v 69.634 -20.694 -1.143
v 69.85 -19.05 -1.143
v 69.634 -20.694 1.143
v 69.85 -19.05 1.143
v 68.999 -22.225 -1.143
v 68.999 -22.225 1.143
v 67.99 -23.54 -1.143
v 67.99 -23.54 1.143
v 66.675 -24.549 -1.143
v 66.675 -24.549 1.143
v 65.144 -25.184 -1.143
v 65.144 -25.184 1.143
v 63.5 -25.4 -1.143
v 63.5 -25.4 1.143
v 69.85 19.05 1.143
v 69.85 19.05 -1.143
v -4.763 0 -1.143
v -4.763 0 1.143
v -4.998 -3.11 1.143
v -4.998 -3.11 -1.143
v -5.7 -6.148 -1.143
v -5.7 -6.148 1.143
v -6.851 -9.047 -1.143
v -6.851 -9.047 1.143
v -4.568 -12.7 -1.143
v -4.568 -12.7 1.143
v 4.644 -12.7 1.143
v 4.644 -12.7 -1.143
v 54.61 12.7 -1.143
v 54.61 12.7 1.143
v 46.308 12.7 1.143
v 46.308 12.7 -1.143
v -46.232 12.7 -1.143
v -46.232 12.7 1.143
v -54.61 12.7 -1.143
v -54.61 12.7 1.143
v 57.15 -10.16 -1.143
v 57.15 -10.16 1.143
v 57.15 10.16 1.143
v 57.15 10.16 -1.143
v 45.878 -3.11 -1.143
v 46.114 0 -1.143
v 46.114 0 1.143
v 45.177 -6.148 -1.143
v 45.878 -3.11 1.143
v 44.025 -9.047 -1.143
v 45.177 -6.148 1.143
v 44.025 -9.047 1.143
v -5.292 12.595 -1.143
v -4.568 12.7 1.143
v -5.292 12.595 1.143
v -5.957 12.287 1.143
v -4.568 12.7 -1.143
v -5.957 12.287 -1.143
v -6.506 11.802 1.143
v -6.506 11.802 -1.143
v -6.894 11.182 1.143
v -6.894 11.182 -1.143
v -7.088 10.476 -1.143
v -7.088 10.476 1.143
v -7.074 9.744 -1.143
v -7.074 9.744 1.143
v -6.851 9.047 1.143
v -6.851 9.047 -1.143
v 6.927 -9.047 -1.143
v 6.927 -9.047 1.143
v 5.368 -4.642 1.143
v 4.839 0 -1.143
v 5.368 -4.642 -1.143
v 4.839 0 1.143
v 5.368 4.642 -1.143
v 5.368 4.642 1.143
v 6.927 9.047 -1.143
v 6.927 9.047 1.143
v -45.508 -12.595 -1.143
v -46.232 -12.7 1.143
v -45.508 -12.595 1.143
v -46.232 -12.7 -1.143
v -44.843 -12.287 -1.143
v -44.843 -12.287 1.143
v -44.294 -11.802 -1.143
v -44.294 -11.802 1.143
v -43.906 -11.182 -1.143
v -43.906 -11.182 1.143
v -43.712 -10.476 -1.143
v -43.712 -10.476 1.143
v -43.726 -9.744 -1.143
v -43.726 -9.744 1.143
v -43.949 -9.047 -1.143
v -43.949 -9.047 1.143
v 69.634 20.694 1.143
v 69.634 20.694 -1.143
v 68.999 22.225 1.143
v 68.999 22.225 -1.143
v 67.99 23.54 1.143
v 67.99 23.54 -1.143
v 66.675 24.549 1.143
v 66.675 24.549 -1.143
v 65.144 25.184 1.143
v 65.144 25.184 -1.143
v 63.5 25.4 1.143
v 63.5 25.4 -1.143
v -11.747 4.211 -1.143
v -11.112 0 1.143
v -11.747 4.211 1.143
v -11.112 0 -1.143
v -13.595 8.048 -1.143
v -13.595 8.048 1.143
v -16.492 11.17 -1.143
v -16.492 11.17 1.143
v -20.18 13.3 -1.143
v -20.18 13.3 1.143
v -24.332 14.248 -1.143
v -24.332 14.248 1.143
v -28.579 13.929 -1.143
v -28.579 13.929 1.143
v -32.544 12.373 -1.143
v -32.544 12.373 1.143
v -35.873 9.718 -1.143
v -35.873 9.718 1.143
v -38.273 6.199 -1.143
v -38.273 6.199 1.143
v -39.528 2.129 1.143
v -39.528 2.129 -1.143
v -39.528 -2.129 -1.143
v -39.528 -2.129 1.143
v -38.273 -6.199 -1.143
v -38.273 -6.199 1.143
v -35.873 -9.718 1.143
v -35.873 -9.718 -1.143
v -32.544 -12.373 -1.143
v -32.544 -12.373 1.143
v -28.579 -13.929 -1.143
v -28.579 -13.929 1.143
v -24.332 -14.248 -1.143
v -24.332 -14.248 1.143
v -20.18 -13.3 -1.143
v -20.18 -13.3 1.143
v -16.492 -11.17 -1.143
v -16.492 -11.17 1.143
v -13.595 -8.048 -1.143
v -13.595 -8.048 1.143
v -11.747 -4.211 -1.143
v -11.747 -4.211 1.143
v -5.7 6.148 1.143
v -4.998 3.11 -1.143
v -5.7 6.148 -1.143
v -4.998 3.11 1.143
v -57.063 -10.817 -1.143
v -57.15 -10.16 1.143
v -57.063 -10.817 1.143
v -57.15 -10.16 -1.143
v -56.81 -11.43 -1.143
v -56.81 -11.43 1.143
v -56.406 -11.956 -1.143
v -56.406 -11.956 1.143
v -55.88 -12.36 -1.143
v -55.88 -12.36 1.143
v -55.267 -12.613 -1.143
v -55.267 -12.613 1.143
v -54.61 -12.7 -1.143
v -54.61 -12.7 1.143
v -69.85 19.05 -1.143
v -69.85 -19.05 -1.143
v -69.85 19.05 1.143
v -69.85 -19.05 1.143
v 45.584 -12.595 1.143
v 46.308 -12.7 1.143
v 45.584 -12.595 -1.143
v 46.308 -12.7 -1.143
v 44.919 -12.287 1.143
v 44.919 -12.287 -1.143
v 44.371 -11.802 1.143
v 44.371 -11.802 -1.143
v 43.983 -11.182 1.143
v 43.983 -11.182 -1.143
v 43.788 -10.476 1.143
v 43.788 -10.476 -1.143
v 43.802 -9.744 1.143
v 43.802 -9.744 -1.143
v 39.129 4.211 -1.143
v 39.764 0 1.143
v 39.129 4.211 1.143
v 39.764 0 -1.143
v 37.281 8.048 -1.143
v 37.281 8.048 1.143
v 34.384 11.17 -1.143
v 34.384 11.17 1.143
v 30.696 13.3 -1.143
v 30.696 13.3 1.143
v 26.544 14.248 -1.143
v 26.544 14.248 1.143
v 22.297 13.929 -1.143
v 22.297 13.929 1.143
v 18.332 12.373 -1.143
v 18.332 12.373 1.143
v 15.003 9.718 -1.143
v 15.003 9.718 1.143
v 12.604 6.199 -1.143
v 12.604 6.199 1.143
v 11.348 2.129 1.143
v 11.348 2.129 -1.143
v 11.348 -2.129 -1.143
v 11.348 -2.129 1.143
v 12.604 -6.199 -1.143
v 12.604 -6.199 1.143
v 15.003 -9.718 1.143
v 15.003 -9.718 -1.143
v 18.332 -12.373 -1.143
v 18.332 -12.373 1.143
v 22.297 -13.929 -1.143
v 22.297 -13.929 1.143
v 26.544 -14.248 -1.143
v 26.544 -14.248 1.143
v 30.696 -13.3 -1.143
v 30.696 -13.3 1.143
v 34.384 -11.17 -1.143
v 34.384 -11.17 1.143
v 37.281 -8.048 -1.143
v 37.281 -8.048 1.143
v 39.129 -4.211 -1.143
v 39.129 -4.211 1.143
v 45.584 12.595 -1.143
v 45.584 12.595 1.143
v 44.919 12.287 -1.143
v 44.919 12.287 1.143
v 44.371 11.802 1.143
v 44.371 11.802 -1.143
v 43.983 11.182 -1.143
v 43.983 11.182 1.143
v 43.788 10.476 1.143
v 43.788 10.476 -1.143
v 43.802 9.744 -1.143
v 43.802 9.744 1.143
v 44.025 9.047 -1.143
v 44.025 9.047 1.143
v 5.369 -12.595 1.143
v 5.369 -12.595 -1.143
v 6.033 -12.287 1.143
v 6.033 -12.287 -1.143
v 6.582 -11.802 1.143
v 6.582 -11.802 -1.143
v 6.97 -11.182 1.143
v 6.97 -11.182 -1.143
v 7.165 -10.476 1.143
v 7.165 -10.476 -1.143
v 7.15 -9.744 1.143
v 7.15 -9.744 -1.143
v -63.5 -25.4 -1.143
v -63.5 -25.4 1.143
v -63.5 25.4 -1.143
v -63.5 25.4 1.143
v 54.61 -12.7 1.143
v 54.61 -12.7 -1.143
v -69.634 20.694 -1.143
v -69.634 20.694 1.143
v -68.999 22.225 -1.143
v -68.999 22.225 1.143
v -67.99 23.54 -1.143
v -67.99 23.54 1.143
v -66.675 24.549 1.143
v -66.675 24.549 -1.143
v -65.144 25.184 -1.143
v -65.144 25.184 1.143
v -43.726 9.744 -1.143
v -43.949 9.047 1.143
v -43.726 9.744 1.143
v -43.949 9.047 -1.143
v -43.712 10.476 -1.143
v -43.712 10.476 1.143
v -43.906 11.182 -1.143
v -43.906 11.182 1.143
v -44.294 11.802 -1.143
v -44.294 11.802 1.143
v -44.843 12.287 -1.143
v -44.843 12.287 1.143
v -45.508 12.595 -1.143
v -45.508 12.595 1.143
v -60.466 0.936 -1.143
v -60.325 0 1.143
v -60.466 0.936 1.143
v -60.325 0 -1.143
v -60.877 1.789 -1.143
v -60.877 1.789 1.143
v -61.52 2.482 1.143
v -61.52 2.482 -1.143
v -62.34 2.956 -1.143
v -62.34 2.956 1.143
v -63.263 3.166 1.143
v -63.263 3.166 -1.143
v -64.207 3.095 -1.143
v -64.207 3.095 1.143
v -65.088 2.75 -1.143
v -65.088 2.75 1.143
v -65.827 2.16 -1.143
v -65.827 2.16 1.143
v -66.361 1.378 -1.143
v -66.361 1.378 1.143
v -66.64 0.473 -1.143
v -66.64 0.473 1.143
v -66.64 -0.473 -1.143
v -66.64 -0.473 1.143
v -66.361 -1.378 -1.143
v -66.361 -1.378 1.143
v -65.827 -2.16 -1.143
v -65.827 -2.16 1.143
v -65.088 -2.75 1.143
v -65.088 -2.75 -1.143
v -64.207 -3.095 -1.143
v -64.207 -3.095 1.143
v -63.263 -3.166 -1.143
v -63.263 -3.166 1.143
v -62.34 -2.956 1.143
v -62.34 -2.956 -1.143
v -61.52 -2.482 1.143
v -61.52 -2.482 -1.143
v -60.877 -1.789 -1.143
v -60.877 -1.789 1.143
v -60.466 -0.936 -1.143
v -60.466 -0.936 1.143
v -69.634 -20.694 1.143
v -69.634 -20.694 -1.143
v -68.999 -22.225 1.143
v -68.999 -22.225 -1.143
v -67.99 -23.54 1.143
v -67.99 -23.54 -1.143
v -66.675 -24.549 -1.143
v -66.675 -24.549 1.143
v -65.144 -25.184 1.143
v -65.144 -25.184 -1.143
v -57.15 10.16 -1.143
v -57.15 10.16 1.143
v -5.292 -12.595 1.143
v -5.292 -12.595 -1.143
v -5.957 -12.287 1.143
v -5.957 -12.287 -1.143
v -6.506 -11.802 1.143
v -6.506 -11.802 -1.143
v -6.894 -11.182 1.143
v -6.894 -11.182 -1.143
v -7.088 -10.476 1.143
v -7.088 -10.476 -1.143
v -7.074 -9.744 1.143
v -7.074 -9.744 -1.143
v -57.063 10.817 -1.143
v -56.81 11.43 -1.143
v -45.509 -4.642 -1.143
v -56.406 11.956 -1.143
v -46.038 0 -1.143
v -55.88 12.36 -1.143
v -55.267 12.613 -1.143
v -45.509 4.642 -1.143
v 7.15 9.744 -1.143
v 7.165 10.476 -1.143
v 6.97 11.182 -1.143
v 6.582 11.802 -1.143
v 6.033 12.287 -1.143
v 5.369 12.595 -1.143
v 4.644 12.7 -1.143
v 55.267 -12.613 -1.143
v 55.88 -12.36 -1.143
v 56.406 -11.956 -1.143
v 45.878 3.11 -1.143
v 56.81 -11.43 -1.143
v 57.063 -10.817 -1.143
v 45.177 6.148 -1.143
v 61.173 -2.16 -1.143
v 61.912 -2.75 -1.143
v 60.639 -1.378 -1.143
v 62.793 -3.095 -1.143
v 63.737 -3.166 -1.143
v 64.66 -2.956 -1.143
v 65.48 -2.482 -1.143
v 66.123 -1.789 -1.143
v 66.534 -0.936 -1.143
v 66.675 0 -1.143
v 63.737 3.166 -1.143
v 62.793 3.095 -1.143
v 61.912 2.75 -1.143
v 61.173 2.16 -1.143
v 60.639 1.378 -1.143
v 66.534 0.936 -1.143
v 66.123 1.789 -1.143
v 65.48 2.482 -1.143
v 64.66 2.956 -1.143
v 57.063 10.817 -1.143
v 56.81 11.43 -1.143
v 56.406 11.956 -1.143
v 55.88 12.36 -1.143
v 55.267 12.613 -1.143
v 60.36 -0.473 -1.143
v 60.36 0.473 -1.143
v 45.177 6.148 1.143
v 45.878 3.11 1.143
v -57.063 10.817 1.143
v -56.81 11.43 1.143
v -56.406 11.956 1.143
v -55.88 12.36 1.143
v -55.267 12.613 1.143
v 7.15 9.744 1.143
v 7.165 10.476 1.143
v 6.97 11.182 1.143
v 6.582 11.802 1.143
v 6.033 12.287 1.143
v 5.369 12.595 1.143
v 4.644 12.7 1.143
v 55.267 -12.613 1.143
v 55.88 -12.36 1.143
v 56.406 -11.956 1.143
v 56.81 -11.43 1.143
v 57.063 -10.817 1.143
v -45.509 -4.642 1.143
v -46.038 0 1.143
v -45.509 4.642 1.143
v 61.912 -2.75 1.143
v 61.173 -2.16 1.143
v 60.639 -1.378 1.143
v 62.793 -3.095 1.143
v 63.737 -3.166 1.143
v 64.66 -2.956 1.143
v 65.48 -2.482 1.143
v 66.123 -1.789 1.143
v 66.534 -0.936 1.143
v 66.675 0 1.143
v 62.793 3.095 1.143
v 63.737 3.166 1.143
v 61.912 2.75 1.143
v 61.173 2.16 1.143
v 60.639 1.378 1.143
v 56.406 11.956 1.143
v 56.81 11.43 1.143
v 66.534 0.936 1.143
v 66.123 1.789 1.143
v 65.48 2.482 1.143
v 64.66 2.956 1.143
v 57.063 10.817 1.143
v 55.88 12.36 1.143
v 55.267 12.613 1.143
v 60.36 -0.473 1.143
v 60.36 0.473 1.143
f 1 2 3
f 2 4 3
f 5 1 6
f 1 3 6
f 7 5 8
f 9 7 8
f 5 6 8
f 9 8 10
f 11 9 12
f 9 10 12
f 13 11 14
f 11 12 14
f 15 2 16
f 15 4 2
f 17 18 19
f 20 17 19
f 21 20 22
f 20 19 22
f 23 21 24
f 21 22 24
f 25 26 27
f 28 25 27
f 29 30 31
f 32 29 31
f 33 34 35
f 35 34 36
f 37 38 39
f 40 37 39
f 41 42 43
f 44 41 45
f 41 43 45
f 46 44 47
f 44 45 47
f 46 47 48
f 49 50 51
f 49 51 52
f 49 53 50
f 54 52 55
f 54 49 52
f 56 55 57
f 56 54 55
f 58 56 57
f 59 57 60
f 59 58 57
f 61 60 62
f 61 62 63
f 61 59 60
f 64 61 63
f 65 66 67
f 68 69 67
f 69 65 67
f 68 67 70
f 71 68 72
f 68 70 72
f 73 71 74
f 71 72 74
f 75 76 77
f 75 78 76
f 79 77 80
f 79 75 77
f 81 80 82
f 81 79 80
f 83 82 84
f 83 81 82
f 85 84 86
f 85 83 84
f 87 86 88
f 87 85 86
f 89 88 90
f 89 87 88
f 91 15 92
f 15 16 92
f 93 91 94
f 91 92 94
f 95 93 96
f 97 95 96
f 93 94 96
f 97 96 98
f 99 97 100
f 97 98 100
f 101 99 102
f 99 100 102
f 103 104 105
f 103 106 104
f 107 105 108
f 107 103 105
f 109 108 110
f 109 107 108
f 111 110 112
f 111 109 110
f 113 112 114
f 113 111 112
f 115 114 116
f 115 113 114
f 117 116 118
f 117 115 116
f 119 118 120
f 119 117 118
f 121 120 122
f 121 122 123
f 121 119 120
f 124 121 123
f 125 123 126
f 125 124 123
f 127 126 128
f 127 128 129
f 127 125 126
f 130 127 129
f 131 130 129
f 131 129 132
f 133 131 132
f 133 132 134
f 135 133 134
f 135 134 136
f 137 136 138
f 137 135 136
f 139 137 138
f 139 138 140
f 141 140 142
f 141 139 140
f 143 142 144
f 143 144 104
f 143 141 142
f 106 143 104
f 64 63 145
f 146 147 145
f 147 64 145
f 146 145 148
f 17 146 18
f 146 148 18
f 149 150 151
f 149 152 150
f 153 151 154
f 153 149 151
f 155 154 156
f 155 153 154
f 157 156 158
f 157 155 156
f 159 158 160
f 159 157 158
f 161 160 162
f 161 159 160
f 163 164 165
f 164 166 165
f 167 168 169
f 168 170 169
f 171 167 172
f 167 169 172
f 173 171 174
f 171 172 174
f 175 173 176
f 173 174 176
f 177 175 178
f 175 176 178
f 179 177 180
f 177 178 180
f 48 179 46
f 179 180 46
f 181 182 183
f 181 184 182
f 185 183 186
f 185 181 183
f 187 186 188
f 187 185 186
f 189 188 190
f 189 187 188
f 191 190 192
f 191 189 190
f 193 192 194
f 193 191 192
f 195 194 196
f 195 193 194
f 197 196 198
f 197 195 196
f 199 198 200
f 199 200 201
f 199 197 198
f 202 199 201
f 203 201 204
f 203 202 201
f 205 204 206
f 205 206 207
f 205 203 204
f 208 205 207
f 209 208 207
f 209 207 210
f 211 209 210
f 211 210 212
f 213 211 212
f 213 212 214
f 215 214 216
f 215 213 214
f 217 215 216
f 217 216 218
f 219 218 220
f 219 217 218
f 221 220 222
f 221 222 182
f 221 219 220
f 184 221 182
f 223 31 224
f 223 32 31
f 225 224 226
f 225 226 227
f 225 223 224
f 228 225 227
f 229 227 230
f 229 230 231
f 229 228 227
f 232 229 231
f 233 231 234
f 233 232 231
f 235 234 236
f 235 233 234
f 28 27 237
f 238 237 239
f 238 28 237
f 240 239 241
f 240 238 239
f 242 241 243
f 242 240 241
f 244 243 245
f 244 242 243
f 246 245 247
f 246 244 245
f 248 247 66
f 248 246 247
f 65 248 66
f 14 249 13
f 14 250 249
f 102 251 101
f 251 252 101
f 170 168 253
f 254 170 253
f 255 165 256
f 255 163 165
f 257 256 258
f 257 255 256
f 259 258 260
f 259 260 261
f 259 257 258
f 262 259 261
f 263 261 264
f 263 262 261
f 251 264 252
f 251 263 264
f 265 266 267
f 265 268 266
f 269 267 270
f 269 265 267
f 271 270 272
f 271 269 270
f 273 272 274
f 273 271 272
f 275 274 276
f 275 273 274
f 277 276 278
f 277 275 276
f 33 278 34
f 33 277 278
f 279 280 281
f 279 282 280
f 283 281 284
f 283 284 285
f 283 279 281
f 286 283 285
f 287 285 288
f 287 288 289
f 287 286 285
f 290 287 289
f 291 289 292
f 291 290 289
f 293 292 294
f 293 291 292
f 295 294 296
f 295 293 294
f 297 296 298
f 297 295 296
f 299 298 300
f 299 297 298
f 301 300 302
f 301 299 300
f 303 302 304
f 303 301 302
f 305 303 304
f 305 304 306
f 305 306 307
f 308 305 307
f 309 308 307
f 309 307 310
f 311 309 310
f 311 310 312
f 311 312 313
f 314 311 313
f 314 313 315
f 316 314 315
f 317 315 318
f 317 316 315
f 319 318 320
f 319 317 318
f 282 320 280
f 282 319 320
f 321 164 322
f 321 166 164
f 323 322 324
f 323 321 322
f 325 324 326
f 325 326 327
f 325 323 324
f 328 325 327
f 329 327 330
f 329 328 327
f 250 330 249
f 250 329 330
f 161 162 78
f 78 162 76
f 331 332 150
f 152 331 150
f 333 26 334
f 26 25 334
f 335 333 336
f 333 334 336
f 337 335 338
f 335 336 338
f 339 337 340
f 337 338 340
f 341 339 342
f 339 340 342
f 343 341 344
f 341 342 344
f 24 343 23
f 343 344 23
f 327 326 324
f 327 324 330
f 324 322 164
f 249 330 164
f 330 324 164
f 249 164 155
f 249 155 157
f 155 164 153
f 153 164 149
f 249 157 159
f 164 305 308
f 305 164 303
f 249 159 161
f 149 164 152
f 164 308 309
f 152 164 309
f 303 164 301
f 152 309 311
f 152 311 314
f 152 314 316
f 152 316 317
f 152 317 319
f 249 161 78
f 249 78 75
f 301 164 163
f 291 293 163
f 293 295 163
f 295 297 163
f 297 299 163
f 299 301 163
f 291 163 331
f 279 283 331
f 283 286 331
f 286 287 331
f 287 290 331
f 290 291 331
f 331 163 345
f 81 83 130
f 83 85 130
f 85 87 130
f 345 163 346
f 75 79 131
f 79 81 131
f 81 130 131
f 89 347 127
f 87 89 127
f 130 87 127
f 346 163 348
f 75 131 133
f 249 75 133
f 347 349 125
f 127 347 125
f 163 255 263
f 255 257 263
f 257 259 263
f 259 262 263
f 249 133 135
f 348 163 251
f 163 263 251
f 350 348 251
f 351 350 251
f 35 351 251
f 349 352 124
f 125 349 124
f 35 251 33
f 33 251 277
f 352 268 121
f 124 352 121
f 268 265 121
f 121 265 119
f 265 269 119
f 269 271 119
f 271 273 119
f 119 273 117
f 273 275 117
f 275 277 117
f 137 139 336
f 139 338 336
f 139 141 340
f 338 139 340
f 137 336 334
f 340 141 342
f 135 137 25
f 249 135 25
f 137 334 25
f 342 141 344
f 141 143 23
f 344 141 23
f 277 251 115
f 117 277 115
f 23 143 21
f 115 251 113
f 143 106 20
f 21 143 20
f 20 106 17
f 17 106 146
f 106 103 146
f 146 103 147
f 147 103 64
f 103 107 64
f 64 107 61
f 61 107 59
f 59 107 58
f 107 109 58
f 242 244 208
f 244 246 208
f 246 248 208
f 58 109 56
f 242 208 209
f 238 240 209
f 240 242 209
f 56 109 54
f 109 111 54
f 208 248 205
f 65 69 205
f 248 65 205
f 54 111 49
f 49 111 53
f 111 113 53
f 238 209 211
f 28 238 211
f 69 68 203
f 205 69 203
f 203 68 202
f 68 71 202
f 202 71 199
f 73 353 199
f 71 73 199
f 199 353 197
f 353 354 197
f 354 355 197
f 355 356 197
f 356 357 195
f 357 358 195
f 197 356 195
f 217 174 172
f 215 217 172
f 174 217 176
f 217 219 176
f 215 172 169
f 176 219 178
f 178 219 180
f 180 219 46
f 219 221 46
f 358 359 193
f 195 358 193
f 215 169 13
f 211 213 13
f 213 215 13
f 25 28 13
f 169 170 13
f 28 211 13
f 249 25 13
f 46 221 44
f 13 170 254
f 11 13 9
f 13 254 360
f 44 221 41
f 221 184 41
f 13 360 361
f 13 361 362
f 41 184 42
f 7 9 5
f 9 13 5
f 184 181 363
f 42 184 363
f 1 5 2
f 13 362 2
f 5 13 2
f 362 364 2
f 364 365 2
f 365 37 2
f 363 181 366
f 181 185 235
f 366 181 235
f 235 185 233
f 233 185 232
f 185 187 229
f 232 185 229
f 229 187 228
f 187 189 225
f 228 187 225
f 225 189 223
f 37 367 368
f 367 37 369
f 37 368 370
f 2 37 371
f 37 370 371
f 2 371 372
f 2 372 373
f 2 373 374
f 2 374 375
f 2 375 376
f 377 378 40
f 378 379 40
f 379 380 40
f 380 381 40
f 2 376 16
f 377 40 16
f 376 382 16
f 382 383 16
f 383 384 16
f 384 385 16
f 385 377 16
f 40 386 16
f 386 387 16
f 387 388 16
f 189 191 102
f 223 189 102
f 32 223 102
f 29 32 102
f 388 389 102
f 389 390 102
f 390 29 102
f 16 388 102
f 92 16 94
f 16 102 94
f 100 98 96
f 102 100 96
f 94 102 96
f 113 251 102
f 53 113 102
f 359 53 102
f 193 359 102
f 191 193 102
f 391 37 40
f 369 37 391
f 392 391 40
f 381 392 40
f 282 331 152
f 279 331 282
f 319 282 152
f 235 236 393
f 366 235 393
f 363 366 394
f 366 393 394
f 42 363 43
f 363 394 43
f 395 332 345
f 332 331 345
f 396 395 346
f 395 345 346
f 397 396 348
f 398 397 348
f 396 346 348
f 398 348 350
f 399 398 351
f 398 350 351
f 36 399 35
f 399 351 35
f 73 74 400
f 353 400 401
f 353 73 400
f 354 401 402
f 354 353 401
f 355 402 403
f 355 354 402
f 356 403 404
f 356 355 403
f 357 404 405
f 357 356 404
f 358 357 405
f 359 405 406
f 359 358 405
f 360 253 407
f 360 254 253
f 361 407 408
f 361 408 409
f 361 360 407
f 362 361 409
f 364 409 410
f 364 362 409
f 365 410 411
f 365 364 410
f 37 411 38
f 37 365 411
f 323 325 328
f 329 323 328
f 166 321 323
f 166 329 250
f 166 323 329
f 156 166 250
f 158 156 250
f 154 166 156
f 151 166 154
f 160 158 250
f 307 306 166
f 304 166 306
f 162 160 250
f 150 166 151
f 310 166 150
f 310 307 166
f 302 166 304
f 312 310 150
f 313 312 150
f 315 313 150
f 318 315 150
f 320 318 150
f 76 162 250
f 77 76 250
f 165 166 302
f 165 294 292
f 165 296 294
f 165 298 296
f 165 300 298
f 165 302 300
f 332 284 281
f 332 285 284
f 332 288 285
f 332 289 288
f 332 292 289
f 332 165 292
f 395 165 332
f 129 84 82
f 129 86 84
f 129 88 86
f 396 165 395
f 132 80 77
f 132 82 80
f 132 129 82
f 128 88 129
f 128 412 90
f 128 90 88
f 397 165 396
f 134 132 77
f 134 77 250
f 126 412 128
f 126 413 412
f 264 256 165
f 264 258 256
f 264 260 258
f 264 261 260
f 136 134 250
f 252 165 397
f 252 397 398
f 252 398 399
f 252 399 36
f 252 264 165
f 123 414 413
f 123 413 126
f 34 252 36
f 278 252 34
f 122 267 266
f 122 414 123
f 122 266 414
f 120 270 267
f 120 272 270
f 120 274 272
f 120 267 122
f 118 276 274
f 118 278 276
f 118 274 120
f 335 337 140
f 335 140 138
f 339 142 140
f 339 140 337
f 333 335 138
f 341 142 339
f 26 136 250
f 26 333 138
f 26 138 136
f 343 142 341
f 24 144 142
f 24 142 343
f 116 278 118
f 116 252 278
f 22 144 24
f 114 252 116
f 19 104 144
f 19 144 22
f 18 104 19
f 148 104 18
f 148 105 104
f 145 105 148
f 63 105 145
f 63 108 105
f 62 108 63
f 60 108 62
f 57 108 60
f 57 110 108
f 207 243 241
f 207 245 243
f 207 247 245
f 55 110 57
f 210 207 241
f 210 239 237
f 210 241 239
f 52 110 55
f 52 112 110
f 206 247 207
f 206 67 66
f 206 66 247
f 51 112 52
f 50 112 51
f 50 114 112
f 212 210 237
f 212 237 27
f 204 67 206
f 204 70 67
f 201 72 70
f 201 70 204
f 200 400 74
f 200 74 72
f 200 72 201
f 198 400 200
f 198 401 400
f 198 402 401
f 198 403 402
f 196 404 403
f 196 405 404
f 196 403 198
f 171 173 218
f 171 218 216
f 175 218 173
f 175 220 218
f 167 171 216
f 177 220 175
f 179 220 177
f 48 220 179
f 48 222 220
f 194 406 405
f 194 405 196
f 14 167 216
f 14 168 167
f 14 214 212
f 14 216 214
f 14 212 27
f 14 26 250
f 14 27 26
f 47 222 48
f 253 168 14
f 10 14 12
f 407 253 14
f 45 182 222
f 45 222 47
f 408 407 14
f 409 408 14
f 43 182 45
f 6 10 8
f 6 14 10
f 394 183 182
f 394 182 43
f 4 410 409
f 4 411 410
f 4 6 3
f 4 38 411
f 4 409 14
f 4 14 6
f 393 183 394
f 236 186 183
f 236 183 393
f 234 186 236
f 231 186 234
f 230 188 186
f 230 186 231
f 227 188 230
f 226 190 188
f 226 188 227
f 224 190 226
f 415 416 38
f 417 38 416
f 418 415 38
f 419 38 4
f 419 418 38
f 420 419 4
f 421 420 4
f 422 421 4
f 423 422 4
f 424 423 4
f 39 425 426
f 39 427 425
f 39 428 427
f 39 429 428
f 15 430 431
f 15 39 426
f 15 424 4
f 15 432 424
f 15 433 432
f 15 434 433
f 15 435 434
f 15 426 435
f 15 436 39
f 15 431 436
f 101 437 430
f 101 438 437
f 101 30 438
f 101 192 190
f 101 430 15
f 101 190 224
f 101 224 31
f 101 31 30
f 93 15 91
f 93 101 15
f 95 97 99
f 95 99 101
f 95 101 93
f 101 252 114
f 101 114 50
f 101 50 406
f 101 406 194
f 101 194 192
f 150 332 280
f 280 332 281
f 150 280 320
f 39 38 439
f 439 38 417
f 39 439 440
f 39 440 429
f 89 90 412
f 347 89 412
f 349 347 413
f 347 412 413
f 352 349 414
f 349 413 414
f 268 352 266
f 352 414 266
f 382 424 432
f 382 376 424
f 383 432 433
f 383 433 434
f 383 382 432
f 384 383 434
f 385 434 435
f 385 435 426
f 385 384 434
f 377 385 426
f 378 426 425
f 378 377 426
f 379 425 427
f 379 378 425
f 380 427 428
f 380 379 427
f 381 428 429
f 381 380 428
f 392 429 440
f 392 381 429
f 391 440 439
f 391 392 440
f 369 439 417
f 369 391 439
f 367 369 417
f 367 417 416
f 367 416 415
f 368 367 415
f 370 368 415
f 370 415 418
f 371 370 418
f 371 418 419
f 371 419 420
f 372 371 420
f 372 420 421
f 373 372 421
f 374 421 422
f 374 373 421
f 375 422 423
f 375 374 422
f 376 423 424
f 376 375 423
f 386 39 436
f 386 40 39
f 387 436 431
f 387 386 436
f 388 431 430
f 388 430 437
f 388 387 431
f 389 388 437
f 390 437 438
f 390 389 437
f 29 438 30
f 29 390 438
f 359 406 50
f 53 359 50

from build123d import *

# Parameters (mm, degrees)
SKETCH1_W           = 139.7
SKETCH1_H           = 50.8
SKETCH1_R           = 3.175
SKETCH1_R_2         = 14.2875
BOSS_EXTRUDE1_DEPTH = 1.143
FILLET1_R           = 6.35
CUT_EXTRUDE1_DEPTH  = 2.54
FILLET2_R           = 2.54


with BuildPart() as part:
    # Sketch1 → Boss-Extrude1 (new, symmetric)
    with BuildSketch(Plane.XY):
        Rectangle(SKETCH1_W, SKETCH1_H)
        with Locations((-63.5, 0)):
            Circle(SKETCH1_R, mode=Mode.SUBTRACT)
        with Locations((63.5, 0)):
            Circle(SKETCH1_R, mode=Mode.SUBTRACT)
        with Locations((-25.4, 0)):
            Circle(SKETCH1_R_2, mode=Mode.SUBTRACT)
        with Locations((25.4762, 0)):
            Circle(SKETCH1_R_2, mode=Mode.SUBTRACT)
    extrude(amount=BOSS_EXTRUDE1_DEPTH, both=True)

    # Fillet1
    fillet1_edges = [part.edges().sort_by_distance(p)[0] for p in [
        (69.85, -25.4, 0),
        (-69.85, -25.4, 0),
        (-69.85, 25.4, 0),
        (69.85, 25.4, 0),
    ]]
    fillet(fillet1_edges, radius=FILLET1_R)

    # Sketch2 → Cut-Extrude1 (cut)
    with BuildSketch(Plane.XY.offset(1.143)):
        with BuildLine():
            Line((-57.15, 12.7), (-57.15, -12.7))
            Line((-57.15, -12.7), (-41.667034341, -12.7))
            ThreePointArc((-41.667034341, -12.7), (-46.0375, 0), (-41.667034341, 12.7))
            Line((-41.667034341, 12.7), (-57.15, 12.7))
        make_face()
        with BuildLine():
            ThreePointArc((-4.7625, 0), (-5.885680547, -6.715485278), (-9.132965659, -12.7))
            Line((-9.132965659, -12.7), (9.209165659, -12.7))
            ThreePointArc((9.209165659, -12.7), (4.8387, 0), (9.209165659, 12.7))
            Line((9.209165659, 12.7), (-9.132965659, 12.7))
            ThreePointArc((-9.132965659, 12.7), (-5.885680547, 6.715485278), (-4.7625, 0))
        make_face()
        with BuildLine():
            ThreePointArc((46.1137, 0), (44.990519453, -6.715485278), (41.743234341, -12.7))
            Line((41.743234341, -12.7), (57.15, -12.7))
            Line((57.15, -12.7), (57.15, 12.7))
            Line((57.15, 12.7), (41.743234341, 12.7))
            ThreePointArc((41.743234341, 12.7), (44.990519453, 6.715485278), (46.1137, 0))
        make_face()
    extrude(amount=-CUT_EXTRUDE1_DEPTH, mode=Mode.SUBTRACT)

    # Fillet2
    fillet2_edges = [part.edges().sort_by_distance(p)[0] for p in [
        (-41.667034341, 12.7, 0),
        (-41.667034341, -12.7, 0),
        (-57.15, -12.7, 0),
        (-57.15, 12.7, 0),
        (9.209165659, 12.7, 0),
        (9.209165659, -12.7, 0),
        (-9.132965659, -12.7, 0),
        (-9.132965659, 12.7, 0),
        (41.743234341, -12.7, 0),
        (41.743234341, 12.7, 0),
        (57.15, 12.7, 0),
        (57.15, -12.7, 0),
    ]]
    fillet(fillet2_edges, radius=FILLET2_R)


solid = part.part
